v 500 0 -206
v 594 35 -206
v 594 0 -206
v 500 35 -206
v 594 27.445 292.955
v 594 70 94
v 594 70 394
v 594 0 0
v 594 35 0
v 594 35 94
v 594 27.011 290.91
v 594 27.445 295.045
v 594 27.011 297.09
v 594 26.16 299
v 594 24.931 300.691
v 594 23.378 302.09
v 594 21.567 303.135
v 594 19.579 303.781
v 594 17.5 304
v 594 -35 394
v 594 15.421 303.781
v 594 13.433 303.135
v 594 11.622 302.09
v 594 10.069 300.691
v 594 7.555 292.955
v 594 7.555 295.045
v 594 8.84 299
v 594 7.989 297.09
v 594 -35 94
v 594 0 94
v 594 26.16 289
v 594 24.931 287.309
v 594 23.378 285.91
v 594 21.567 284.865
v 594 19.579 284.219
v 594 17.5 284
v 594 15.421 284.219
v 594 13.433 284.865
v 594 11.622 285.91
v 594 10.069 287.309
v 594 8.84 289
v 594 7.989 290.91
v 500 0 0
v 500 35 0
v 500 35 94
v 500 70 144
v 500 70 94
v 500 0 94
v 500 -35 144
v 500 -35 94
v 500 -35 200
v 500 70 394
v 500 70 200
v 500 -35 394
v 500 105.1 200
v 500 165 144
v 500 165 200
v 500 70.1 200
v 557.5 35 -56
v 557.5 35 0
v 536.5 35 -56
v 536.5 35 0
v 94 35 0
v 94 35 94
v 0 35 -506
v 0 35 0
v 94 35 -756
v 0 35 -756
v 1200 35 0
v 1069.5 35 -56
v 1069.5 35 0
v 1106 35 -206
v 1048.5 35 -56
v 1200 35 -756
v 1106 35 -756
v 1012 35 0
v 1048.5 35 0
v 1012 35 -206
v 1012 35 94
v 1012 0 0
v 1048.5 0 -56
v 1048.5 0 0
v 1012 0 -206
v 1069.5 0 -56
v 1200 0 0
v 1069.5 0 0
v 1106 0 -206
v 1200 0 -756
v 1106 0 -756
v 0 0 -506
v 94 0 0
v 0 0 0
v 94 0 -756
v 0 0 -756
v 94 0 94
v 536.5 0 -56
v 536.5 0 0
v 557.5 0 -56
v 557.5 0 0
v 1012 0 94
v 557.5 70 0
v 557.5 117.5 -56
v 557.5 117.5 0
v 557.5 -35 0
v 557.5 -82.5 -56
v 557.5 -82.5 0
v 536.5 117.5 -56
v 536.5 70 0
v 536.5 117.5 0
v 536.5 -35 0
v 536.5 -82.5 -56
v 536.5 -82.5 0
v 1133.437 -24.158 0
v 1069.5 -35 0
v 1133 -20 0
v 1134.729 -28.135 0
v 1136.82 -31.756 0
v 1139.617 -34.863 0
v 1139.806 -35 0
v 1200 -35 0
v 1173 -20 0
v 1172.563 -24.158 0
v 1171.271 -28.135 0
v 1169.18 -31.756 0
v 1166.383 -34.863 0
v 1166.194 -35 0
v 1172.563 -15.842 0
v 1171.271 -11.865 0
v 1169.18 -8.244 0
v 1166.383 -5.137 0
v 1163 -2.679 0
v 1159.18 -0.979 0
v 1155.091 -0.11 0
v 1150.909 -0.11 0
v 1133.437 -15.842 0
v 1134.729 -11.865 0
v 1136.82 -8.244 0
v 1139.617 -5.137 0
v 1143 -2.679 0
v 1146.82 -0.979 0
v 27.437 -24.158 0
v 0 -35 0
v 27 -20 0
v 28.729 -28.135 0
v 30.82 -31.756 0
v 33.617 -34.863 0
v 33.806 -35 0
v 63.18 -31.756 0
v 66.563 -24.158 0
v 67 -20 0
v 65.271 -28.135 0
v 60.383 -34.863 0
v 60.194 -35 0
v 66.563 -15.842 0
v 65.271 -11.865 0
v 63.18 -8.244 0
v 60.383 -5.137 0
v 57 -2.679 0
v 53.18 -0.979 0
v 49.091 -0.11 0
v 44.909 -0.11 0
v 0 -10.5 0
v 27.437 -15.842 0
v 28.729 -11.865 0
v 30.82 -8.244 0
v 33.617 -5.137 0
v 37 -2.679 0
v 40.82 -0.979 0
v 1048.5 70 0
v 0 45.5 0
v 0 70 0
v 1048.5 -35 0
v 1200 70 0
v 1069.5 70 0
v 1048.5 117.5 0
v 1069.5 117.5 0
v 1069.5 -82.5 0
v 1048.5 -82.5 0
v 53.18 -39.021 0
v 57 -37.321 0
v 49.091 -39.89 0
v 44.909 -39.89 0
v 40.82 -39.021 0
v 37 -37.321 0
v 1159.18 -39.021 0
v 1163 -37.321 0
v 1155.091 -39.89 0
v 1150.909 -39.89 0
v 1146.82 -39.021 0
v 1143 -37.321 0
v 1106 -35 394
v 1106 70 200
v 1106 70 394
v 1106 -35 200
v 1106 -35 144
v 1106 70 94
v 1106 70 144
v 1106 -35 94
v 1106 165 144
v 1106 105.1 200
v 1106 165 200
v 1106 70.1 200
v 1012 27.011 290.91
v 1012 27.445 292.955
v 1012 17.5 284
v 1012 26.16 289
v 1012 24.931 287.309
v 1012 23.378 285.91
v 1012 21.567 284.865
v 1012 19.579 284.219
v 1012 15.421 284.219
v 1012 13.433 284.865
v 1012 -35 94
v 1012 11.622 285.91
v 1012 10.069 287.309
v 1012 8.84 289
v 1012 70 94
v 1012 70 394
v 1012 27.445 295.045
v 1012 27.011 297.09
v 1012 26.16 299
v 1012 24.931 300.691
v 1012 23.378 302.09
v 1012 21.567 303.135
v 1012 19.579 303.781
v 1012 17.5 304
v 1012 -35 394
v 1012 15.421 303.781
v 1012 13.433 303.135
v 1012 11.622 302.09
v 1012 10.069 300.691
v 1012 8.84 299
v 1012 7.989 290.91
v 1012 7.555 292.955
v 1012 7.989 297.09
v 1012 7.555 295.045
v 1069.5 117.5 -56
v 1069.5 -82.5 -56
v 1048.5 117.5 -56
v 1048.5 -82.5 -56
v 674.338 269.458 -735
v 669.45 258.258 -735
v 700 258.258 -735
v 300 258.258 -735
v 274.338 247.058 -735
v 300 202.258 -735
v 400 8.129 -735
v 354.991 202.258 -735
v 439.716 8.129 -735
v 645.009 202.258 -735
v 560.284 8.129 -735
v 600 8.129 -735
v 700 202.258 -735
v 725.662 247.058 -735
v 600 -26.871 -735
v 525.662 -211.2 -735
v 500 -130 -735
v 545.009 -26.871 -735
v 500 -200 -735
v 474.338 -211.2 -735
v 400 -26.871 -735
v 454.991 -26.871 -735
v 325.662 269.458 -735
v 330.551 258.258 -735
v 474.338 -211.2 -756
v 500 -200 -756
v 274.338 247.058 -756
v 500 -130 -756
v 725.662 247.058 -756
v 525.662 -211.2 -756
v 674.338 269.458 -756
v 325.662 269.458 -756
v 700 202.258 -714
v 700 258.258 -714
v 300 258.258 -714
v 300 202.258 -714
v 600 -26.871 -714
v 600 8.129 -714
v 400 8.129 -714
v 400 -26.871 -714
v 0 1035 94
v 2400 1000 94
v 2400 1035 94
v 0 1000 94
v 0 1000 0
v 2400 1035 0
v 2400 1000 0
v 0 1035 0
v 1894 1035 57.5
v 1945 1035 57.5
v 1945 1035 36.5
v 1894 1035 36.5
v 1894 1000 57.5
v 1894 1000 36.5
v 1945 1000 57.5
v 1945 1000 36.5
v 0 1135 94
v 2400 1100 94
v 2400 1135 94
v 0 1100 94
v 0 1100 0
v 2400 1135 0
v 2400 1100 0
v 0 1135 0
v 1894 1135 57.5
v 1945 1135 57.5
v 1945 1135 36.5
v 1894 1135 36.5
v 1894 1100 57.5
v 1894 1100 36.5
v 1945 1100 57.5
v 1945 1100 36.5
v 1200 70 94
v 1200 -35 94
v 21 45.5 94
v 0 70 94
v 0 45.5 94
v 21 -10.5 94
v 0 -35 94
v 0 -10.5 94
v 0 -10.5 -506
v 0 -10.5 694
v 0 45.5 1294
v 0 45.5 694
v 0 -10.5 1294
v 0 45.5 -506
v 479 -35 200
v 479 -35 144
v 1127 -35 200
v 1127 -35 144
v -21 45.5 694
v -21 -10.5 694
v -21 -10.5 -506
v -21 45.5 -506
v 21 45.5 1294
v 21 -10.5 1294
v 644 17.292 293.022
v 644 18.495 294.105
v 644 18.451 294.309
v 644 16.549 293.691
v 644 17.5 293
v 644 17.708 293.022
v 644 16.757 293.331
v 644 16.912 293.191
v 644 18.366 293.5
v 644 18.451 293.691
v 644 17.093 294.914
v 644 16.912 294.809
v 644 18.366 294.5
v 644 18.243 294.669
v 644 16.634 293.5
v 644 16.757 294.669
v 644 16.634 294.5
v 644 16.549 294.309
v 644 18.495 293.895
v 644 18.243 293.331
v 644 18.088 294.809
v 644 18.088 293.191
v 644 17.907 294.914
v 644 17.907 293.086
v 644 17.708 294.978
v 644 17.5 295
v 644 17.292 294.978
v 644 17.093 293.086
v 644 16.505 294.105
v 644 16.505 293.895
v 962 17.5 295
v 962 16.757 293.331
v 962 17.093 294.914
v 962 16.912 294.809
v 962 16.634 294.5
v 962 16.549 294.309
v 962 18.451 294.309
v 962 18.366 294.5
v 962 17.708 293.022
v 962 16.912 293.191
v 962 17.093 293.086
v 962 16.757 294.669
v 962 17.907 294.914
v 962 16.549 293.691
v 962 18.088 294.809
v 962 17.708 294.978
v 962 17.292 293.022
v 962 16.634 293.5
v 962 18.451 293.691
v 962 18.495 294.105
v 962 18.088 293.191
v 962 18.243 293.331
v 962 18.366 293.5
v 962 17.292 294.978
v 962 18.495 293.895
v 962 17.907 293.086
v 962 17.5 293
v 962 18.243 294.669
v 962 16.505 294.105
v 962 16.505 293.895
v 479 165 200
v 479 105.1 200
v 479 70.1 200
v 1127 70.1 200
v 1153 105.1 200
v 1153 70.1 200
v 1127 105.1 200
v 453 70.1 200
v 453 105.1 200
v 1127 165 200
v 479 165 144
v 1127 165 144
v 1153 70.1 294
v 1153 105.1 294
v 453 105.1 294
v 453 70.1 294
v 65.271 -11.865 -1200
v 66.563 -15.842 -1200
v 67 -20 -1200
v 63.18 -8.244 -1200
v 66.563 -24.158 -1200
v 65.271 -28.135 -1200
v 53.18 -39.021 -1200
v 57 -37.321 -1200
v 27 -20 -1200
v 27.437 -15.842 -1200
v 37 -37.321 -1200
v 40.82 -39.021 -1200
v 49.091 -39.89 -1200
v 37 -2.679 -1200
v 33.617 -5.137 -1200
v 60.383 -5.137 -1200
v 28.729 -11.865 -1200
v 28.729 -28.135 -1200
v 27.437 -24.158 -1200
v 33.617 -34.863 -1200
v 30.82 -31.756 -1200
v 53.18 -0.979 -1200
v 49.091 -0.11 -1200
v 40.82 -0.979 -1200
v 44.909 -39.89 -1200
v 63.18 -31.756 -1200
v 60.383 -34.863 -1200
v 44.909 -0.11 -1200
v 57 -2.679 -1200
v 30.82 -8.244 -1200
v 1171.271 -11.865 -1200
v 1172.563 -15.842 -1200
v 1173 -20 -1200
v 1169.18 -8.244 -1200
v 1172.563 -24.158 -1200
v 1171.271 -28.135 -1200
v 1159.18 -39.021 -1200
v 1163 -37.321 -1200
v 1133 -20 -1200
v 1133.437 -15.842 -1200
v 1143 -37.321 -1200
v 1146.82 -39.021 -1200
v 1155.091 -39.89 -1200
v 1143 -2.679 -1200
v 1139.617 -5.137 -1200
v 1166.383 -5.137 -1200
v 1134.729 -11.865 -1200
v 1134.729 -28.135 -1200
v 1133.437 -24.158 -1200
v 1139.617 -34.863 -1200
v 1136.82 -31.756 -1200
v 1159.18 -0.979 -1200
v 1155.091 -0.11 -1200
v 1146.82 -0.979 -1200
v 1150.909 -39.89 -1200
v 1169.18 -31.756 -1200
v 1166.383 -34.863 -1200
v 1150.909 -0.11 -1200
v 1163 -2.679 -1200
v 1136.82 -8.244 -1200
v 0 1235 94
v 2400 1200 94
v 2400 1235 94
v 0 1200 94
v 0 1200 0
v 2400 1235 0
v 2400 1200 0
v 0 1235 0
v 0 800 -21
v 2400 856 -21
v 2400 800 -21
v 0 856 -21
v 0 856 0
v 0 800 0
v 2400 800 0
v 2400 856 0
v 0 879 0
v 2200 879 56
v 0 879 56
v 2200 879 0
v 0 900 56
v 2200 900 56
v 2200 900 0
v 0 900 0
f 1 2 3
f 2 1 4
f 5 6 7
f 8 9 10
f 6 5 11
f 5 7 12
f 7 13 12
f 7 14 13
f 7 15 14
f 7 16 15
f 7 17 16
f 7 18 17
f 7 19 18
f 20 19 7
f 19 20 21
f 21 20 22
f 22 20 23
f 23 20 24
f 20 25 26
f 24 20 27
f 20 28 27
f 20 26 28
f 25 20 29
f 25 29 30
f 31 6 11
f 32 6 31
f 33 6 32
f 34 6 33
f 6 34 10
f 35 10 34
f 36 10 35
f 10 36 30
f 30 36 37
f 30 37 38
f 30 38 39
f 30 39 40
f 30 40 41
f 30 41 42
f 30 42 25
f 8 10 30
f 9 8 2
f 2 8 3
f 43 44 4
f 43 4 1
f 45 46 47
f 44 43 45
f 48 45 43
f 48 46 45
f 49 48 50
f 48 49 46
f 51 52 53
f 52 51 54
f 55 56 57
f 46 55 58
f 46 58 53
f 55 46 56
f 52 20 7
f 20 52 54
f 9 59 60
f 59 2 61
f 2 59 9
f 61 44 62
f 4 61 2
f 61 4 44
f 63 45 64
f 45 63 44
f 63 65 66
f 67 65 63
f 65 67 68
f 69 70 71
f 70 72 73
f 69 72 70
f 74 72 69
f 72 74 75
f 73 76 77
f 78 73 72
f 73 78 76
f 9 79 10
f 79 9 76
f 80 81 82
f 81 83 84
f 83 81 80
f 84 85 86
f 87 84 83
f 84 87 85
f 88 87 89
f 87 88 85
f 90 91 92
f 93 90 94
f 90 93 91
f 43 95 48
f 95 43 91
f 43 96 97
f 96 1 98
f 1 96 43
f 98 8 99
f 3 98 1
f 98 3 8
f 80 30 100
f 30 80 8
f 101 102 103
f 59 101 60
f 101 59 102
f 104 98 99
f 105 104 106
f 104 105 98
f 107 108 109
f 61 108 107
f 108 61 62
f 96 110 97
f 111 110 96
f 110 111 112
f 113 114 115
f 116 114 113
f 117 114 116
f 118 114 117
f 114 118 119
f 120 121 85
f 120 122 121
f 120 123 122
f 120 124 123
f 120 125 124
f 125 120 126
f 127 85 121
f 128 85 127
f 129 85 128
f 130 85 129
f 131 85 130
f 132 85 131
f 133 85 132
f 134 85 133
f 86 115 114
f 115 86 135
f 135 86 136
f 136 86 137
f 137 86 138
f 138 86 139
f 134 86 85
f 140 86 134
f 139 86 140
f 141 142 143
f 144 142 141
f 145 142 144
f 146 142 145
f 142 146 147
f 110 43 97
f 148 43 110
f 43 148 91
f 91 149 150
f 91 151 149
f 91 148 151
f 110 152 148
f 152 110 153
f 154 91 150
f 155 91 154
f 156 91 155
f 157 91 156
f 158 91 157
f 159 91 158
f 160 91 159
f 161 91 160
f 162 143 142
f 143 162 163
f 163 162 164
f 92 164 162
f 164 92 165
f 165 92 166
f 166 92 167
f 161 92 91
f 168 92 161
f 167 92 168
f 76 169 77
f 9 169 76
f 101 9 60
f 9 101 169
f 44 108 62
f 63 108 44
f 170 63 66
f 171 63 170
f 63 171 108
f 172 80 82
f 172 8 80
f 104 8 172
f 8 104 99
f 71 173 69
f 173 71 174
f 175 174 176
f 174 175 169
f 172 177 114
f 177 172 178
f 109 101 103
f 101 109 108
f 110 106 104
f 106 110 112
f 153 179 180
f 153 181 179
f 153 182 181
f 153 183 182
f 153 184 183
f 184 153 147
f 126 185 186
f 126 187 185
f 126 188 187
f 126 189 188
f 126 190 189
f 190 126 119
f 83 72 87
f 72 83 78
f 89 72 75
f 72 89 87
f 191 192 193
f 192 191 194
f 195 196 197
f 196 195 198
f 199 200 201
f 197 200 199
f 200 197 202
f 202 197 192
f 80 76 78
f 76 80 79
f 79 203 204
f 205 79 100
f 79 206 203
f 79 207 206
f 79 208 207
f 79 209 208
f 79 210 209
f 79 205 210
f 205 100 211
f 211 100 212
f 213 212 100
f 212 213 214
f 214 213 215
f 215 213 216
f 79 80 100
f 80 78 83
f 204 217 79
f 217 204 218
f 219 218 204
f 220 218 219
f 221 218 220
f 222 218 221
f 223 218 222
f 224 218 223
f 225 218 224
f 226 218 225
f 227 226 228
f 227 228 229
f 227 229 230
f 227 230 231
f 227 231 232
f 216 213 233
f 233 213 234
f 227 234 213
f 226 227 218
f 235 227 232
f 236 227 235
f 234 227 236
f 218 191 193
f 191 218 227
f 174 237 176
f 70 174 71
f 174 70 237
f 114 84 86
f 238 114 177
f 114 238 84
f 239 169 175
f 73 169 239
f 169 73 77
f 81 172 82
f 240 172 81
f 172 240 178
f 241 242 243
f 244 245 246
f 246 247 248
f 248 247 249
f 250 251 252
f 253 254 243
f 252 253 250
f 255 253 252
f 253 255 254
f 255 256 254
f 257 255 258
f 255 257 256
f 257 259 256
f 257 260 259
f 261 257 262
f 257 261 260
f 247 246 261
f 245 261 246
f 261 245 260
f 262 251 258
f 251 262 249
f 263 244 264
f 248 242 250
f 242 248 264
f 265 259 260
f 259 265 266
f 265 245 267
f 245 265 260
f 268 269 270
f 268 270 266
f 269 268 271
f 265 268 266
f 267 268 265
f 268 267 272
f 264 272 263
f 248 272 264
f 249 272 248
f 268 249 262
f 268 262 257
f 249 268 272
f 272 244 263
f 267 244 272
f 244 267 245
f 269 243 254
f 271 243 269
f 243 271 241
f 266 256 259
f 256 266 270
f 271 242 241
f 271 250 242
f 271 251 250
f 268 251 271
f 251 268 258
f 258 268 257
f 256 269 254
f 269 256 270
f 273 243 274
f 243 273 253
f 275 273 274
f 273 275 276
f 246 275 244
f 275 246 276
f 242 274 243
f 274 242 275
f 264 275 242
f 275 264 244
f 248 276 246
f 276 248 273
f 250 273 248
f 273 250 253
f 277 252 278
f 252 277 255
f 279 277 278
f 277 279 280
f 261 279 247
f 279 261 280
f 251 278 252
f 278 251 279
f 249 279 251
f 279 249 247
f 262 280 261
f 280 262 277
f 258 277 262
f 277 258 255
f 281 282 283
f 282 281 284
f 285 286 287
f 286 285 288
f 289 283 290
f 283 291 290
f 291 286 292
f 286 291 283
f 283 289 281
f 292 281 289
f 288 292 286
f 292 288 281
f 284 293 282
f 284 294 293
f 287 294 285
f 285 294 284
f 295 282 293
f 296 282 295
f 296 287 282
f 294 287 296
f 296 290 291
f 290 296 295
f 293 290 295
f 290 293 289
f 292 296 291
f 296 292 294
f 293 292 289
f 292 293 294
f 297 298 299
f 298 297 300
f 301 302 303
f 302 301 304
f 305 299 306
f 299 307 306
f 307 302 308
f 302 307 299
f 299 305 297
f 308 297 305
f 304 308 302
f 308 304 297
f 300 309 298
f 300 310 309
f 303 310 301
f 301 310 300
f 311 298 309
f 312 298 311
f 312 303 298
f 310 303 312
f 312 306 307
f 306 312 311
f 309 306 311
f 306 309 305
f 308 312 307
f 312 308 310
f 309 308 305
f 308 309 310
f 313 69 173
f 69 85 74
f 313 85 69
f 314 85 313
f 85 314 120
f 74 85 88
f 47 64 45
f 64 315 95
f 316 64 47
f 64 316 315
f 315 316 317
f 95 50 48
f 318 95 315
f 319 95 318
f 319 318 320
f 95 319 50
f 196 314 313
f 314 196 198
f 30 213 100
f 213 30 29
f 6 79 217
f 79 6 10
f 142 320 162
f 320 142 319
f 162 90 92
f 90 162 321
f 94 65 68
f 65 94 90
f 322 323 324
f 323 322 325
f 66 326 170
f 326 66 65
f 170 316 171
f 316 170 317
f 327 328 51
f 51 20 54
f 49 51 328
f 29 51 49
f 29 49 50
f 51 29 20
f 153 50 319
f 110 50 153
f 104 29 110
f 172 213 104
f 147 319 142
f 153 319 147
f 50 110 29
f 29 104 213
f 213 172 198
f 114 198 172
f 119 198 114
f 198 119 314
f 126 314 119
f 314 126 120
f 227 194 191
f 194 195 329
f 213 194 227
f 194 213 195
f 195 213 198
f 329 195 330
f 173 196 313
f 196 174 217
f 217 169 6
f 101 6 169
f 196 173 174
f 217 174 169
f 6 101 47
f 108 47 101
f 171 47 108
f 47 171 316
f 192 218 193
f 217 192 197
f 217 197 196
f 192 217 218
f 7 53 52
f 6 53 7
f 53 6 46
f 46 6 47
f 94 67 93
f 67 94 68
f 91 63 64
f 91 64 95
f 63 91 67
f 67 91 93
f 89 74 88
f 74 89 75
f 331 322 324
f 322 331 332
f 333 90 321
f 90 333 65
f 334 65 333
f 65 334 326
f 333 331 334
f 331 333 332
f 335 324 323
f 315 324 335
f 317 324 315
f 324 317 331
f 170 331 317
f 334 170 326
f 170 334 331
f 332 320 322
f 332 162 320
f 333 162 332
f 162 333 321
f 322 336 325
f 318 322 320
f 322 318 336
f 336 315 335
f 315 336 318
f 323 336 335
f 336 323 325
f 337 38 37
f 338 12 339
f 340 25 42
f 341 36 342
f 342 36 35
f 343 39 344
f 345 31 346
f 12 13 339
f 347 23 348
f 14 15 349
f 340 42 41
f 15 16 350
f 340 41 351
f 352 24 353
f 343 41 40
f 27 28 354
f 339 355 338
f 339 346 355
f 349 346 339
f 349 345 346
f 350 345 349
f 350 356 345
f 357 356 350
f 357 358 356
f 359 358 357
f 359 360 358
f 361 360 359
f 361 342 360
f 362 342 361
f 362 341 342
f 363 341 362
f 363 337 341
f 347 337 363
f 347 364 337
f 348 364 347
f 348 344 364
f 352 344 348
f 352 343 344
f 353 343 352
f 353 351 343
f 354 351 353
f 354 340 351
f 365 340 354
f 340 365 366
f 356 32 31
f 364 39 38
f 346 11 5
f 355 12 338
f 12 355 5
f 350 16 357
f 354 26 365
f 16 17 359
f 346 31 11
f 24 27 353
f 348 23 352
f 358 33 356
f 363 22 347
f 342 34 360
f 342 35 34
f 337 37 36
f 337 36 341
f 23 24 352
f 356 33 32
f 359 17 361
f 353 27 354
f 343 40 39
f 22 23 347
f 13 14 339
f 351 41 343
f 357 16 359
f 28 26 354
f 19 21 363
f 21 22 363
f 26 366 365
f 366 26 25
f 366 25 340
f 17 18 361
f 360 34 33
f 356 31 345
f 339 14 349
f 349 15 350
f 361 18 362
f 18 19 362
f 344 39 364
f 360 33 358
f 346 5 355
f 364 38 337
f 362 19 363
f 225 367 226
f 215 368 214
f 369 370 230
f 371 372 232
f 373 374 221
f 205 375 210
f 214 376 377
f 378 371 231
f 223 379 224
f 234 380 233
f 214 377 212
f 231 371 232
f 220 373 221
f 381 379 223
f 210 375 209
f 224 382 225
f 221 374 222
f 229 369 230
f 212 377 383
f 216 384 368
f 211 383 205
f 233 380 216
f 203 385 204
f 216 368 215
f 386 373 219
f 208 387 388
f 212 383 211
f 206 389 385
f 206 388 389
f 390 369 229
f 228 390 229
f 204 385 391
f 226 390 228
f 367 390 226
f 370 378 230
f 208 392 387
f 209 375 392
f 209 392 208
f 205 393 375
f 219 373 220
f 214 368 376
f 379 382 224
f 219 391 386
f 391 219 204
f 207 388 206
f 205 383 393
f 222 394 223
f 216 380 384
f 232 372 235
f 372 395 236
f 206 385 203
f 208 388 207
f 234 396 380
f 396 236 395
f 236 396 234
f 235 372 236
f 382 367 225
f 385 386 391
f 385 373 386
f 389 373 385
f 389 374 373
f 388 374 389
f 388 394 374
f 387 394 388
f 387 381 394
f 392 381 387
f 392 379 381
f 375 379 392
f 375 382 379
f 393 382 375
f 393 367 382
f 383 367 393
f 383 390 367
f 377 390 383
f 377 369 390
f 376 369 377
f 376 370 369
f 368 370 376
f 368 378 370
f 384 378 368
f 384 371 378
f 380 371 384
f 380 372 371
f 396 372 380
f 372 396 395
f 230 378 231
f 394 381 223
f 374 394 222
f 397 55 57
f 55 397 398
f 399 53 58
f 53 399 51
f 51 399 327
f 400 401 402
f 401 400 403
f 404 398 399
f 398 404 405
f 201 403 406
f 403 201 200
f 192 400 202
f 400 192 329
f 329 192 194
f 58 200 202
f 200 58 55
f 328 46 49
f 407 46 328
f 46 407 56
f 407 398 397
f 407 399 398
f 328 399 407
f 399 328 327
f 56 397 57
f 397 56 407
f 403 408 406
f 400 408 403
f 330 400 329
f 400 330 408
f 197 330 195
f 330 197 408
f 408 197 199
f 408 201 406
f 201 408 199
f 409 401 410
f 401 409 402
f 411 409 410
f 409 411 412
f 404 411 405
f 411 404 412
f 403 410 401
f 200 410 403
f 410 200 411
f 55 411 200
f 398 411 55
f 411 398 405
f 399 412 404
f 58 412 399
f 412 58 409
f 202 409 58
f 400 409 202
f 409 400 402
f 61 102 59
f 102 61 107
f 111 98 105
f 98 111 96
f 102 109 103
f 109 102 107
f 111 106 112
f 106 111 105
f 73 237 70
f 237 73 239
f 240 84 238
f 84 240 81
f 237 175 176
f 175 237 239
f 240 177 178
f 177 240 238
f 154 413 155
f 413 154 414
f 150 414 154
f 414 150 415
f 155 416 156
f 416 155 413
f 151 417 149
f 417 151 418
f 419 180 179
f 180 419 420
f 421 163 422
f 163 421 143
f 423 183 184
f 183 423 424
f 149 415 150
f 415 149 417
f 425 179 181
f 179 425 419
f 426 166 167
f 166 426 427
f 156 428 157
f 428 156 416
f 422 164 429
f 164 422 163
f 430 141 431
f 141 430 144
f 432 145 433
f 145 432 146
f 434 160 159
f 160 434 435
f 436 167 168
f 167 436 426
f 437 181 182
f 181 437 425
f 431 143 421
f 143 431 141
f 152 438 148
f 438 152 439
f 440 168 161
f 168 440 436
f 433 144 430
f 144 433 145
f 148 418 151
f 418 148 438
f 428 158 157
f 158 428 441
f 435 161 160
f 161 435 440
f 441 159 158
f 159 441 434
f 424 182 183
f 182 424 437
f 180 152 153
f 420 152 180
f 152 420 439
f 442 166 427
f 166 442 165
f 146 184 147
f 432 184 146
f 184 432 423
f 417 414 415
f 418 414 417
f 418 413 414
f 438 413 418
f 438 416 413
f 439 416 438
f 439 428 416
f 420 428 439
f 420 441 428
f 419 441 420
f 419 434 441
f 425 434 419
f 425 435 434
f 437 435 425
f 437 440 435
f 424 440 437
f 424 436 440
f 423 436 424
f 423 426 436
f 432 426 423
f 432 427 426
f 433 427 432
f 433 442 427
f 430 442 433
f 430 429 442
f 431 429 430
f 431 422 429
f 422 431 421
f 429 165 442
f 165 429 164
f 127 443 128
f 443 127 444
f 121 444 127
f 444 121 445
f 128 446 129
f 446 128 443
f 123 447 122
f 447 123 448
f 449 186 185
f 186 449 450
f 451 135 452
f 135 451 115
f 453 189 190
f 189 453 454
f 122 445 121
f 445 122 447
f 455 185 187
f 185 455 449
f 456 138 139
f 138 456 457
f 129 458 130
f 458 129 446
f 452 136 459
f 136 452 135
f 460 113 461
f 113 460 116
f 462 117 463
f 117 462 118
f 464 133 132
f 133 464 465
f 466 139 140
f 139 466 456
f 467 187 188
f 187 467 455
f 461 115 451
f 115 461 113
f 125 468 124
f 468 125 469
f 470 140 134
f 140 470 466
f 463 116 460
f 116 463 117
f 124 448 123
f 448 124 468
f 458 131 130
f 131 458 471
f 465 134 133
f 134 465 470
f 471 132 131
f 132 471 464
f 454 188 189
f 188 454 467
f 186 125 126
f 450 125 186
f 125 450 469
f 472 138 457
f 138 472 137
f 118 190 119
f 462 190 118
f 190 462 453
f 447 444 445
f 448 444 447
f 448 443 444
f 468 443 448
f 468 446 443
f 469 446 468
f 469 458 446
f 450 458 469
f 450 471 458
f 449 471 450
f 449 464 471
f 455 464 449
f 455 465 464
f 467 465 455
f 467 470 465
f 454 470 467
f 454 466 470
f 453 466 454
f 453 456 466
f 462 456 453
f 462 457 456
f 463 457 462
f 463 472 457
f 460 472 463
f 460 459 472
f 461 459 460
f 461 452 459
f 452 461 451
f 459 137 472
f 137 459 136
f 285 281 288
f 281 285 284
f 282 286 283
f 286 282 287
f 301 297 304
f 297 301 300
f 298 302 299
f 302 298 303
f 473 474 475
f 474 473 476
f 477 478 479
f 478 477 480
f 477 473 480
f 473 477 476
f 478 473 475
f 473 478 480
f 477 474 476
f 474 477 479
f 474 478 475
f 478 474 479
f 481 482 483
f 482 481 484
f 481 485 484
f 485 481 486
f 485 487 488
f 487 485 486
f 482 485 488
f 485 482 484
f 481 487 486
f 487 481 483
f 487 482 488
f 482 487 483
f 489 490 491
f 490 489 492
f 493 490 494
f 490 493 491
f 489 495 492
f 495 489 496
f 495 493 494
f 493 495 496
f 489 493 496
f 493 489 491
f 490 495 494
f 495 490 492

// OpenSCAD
/******************************************************************************!
 * \file tour-a-perche.scad
 * \author Sebastien Beaugrand
 * \sa http://beaugrand.chez.com/
 * \copyright CeCILL 2.1 Free Software license
 ******************************************************************************/
hc = 1050;  // Hauteur coude
L = 1200;   // Longueur gros tasseau
P = 94;     // Profondeur gros tasseau
E = 35;     // Epaisseur gros tasseau
l = 1200;   // Longueur tasseau
p = 56;     // Profondeur tasseau
e = 21;     // Epaisseur tasseau
lp = 300;   // Longueur parement
lt = 300;   // Longueur tenon
hp = 200;   // Hauteur pointes
H = hc-hp;     // Hauteur glissiere
ls = L*2-H*2;  // Longeur support
pp = L-ls;     // Position poupee
module glissiere() { cube([L,E,P]); }
color("orange") translate([0,-E,0]) glissiere();
color("green" ) translate([0, E,0]) glissiere();
module pied() { cube([H,E,P]); }
color("gray") translate([0,  0,P]) rotate([0,90,0]) pied();
color("gray") translate([L-P,0,P]) rotate([0,90,0]) pied();
module poupee() { difference() {
  cube([lp+lt,E,P]);
  translate([lt+P,-1,(P-e)/2]) cube([p-5,E+2,e]); } }
color("orangered"  ) translate([pp,   0,P+lp]) rotate([0,90,0]) poupee();
color("yellowgreen") translate([L-P*2,0,P+lp]) rotate([0,90,0]) poupee();
module parement() { cube([lp,E,P]); }
color("darkorange") translate([pp,   -E,P+lp]) rotate([0,90,0]) parement();
color("darkorange") translate([pp,    E,P+lp]) rotate([0,90,0]) parement();
color("darkgreen" ) translate([L-P*2,-E,P+lp]) rotate([0,90,0]) parement();
color("darkgreen" ) translate([L-P*2, E,P+lp]) rotate([0,90,0]) parement();
module perche() { cube([e,p,l]); }
color("khaki"    ) translate([-e,-p/2+E/2,-l/2+P]) perche();
color("darkkhaki") translate([0, -p/2+E/2,P     ]) perche();
module pointe() { color("gray") cylinder(50,10,1); }
translate([pp+P ,E/2,P+hp]) rotate([0, 90,0]) pointe();
translate([L-P*2,E/2,P+hp]) rotate([0,-90,0]) pointe();
module equerre() { cube([e,200,p]); }
color("violet") translate([pp-e,-E,hp-p]) equerre();
color("violet") translate([L-P ,-E,hp-p]) equerre();
module support() { cube([ls,E,P]); }
color("darkgray") translate([pp-P/2,E*2+0.1,hp]) support();
module clavette() { cube([e,200,p]); }
color("darkviolet") translate([pp +(P-e)/2,E/2-100,-p]) clavette();
color("darkviolet") translate([L-P-(P+e)/2,E/2-100,-p]) clavette();
module piquet() { cylinder(L,20,20); }
translate([P/2,  -20,-L]) piquet();
translate([L-P/2,-20,-L]) piquet();
module pedale1() { cube([500,p,e]); }
module pedale2() { cube([400,p,e]); }
module pedale3() { cube([200,35,e]); }
module pedale() { r = asin(200/500);
  rotate([0,0, r]) translate([0,-p/2,0]) pedale1();
  rotate([0,0,-r]) translate([0,-p/2,0]) pedale1();
  translate([500*cos(r)-p,200,e]) rotate([0,0,-90]) pedale2();
  translate([250*cos(r)-p,100,e]) rotate([0,0,-90]) pedale3(); }
translate([500,-200,P-H]) rotate([0,0,90]) pedale();
// Decoupe
color("darkgreen"  ) translate([0,         1000,0]) parement();
color("green"      ) translate([lp,        1000,0]) glissiere();
color("yellowgreen") translate([lp+L,      1000,0]) poupee();
color("darkgreen"  ) translate([lp+L+lp+lt,1000,0]) parement();
color("darkorange" ) translate([0,         1100,0]) parement();
color("orange"     ) translate([lp,        1100,0]) glissiere();
color("orangered"  ) translate([lp+L,      1100,0]) poupee();
color("darkorange" ) translate([lp+L+lp+lt,1100,0]) parement();
color("gray"       ) translate([0,         1200,0]) pied();
color("darkgray"   ) translate([H,         1200,0]) support();
color("gray"       ) translate([H+700,     1200,0]) pied();
color("khaki"      ) translate([0,    800,0]) rotate([0,90,0 ]) perche();
color("darkkhaki"  ) translate([1200, 800,0]) rotate([0,90,0 ]) perche();
color("violet"     ) translate([0,    900,0]) rotate([0,0,-90]) equerre();
                     translate([200,  900,0]) rotate([90,0,0 ]) pedale1();
color("darkviolet" ) translate([700,  900,0]) rotate([0,0,-90]) clavette();
                     translate([900,  900,0]) rotate([90,0,0 ]) pedale1();
color("violet"     ) translate([1400, 900,0]) rotate([0,0,-90]) equerre();
                     translate([1600, 900,0]) rotate([90,0,0 ]) pedale2();
color("darkviolet" ) translate([2000, 900,0]) rotate([0,0,-90]) clavette();
